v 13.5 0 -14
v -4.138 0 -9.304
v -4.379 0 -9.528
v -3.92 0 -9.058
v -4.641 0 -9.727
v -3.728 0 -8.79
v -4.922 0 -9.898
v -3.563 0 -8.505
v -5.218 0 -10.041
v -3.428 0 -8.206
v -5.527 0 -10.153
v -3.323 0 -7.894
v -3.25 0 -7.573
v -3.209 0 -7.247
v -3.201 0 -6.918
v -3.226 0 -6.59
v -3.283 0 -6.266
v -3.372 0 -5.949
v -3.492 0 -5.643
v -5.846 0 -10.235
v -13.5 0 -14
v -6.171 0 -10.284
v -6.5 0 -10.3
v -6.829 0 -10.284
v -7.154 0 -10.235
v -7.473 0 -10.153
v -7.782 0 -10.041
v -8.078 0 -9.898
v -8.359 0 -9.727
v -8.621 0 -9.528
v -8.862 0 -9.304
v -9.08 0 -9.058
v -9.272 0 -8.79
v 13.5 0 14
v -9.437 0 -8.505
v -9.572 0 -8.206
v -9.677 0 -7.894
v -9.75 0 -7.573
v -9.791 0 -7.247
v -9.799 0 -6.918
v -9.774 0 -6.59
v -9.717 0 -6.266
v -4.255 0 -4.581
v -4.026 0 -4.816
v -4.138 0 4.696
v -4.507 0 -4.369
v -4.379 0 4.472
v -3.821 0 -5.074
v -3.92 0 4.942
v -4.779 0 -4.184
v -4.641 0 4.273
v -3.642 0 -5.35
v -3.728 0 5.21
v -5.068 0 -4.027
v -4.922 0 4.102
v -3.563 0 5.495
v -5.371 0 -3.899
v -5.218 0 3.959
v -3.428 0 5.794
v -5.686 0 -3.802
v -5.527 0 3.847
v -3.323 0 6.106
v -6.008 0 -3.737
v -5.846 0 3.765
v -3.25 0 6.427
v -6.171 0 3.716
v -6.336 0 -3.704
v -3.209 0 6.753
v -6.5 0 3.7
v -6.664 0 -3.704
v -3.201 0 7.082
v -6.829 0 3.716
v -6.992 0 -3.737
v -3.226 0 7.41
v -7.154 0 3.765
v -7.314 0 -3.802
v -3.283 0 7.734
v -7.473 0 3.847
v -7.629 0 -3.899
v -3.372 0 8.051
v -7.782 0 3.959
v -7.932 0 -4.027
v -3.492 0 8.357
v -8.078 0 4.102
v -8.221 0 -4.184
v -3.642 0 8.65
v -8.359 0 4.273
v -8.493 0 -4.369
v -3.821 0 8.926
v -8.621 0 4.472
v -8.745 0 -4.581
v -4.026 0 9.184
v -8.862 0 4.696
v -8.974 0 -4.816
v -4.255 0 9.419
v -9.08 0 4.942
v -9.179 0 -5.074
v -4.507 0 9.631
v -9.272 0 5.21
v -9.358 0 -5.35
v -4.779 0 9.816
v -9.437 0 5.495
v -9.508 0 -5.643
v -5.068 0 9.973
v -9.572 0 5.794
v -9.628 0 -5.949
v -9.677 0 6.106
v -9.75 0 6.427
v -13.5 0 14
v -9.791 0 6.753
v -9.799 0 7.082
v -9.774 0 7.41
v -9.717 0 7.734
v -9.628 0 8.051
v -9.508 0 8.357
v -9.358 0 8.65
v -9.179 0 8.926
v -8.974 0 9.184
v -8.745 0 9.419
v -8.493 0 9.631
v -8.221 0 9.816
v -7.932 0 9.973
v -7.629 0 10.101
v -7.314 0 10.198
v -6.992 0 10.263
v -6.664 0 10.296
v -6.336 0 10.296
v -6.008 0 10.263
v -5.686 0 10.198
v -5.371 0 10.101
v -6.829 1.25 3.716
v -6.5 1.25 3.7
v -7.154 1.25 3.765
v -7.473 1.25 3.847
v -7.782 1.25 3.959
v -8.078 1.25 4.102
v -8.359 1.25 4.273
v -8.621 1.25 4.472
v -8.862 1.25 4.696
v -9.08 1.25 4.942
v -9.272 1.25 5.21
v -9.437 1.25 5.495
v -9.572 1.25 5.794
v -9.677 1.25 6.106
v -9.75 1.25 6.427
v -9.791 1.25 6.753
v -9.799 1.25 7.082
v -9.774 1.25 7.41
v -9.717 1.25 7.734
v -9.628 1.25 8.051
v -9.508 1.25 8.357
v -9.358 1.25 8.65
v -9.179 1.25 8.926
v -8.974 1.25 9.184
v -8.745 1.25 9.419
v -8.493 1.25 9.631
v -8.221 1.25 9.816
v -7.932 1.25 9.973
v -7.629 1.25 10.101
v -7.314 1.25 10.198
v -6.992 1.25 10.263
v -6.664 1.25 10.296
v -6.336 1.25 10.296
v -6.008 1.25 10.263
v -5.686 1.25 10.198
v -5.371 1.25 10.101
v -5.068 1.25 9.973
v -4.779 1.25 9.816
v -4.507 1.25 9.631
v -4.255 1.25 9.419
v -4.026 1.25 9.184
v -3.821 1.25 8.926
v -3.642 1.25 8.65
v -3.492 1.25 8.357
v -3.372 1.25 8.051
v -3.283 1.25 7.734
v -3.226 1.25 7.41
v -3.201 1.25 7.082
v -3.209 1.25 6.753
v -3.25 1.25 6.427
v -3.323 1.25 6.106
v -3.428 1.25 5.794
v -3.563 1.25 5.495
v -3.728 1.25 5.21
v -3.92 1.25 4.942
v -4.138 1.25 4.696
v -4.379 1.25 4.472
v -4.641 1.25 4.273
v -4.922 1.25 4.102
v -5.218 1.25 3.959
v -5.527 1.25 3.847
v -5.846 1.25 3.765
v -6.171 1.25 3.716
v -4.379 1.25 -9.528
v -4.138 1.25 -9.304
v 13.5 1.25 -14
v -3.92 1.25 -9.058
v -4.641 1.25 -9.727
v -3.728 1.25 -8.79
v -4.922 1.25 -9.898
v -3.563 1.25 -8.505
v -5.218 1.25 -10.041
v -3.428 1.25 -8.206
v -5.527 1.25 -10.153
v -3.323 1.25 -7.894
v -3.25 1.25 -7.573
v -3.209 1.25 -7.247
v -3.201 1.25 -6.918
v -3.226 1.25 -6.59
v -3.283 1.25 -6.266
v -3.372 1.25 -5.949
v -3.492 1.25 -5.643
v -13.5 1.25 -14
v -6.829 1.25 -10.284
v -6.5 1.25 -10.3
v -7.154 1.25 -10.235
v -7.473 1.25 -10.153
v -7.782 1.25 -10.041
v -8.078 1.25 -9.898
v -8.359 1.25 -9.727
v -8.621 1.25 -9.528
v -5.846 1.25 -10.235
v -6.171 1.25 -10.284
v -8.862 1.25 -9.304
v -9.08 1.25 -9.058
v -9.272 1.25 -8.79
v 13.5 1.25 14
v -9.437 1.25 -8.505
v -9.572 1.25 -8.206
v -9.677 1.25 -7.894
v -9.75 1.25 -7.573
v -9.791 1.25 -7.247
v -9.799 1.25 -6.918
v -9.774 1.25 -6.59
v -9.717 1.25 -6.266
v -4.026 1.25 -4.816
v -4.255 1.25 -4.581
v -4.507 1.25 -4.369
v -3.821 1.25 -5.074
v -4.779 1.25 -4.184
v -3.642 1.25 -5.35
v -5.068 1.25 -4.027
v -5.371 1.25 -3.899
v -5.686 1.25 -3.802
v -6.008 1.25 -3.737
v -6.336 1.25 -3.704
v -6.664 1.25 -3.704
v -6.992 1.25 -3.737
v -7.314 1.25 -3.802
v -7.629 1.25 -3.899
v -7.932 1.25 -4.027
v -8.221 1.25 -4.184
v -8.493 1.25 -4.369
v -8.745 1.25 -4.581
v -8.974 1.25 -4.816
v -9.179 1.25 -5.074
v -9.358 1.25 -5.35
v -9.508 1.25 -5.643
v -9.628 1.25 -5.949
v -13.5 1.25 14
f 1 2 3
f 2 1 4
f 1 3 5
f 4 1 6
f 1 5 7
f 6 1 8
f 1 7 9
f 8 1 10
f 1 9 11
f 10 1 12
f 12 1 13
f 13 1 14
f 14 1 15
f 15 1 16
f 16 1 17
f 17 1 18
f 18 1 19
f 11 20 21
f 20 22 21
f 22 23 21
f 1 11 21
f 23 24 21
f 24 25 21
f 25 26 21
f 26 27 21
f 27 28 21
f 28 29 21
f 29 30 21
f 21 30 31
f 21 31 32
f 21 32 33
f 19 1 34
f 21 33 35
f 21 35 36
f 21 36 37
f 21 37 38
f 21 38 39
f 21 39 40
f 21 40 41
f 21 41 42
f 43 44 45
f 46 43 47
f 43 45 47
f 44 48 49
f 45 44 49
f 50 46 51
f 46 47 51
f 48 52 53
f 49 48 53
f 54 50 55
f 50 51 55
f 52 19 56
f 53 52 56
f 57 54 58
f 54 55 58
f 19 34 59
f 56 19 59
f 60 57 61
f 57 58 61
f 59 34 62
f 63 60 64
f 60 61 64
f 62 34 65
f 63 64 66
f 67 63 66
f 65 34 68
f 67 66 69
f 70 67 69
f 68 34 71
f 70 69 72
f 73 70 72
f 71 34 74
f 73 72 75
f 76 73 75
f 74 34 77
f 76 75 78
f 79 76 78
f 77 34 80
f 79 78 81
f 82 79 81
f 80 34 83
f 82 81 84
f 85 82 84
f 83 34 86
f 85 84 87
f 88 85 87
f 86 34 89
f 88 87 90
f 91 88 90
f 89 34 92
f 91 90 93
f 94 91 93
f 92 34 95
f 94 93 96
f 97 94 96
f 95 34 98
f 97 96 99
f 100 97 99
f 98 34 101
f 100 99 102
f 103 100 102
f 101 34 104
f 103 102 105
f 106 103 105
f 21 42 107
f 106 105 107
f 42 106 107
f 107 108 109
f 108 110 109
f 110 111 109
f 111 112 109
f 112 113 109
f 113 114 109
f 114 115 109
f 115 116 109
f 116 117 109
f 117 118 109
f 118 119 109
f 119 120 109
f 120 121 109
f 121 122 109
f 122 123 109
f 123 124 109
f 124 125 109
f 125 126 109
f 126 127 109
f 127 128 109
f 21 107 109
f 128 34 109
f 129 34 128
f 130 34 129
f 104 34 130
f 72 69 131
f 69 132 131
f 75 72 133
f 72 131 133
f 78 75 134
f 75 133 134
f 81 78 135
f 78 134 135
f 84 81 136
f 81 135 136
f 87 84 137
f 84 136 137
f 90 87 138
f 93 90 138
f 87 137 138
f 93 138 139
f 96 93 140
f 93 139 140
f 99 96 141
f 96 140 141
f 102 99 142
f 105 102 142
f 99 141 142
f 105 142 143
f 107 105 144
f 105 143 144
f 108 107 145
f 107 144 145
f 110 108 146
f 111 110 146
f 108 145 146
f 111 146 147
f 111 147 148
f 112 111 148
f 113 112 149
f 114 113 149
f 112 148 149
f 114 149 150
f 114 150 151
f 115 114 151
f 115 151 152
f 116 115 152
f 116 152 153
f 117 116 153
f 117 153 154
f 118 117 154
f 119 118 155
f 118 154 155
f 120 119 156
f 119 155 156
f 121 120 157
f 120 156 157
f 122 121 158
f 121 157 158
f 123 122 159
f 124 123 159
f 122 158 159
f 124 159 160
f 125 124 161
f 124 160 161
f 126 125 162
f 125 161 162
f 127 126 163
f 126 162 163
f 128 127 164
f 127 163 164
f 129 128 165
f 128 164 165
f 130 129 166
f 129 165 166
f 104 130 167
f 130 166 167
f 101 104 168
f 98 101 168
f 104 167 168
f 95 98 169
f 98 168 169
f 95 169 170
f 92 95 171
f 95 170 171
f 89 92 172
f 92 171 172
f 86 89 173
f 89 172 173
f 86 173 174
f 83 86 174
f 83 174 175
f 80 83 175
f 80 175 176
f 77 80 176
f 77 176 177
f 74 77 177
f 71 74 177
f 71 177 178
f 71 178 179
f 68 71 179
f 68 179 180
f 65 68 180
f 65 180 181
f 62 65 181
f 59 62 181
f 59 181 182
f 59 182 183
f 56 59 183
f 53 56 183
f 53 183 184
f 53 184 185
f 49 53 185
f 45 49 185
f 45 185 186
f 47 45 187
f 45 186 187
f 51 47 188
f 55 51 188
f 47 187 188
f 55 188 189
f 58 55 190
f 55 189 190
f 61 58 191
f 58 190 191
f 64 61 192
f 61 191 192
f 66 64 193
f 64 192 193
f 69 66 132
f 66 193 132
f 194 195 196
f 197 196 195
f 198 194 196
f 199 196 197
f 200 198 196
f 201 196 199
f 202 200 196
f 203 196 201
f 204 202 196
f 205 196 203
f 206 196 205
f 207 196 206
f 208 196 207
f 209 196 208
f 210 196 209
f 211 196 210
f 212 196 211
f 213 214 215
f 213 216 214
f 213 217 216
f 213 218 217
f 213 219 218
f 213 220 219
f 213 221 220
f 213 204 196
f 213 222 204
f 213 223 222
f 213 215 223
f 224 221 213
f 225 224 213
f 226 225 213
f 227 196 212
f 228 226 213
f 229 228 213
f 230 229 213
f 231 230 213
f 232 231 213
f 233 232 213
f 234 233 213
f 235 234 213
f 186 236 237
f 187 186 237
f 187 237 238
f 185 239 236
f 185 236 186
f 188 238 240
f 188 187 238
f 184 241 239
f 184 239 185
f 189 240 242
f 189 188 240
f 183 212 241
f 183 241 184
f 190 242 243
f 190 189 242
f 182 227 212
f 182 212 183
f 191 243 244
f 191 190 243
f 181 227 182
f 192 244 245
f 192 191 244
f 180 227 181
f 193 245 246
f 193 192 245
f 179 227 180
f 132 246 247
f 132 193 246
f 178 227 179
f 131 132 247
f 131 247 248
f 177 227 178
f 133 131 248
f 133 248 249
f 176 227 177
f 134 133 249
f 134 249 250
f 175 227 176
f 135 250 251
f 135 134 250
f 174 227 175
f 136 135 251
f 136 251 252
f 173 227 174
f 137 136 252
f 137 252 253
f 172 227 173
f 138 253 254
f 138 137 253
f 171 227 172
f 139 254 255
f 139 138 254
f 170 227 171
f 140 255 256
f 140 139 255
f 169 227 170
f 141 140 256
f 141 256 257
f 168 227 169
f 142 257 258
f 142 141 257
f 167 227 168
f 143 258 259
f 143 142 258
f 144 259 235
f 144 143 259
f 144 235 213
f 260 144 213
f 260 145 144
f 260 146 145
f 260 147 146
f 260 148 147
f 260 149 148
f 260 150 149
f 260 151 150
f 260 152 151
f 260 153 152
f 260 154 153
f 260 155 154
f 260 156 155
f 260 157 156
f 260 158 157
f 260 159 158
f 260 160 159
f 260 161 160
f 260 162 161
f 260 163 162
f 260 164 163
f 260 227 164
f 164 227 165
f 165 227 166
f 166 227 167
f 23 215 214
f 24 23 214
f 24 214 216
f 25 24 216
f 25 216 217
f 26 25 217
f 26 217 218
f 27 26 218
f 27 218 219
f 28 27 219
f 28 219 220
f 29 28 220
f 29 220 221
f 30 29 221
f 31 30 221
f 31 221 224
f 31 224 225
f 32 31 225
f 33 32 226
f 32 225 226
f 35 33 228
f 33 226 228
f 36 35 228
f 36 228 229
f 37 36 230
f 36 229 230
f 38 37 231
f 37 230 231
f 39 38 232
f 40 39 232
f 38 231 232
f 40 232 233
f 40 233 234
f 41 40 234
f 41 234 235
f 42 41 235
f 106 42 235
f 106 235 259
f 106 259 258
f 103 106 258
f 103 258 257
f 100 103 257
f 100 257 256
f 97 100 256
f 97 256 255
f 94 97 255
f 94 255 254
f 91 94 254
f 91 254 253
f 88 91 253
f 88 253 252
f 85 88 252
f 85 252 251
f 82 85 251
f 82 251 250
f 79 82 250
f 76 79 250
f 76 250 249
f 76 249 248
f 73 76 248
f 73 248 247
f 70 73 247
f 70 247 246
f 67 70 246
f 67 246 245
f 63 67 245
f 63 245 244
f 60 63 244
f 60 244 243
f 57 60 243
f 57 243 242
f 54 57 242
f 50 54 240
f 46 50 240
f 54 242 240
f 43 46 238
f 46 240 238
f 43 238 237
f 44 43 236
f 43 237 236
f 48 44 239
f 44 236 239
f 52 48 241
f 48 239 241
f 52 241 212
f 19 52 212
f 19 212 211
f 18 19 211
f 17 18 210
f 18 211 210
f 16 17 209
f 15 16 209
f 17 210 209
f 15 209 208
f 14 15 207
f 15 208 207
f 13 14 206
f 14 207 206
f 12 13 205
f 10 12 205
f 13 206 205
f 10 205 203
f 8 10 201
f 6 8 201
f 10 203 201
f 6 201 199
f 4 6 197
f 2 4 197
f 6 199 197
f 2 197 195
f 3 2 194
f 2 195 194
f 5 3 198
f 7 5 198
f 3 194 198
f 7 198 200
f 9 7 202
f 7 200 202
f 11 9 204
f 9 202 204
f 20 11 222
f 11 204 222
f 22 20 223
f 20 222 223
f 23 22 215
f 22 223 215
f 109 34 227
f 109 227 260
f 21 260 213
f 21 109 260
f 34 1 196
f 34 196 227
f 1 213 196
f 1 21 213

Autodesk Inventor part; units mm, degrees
ref_plane "YZ Plane" through (0, 0, 0) normal (1, 0, 0) x (0, 1, 0)
ref_plane "XZ Plane" through (0, 0, 0) normal (0, 1, 0) x (-1, 0, 0)
ref_plane "XY Plane" through (0, 0, 0) normal (0, 0, 1) x (1, 0, 0)
sketch "Sketch1" plane through (0, 0, 0) normal (0, 1, 0) x (-1, 0, 0)
  line L0 (-13.5, 14) -> (13.5, 14)
  line L1 (13.5, 14) -> (13.5, -14)
  line L2 (13.5, -14) -> (-13.5, -14)
  line L3 (-13.5, -14) -> (-13.5, 14)
  line L4 (-13.5, 14) -> (13.5, -14) construction
  line L5 (13.5, 14) -> (-13.5, -14) construction
  point P0 (0, 0)
  dimension "d0" = 27
  dimension "d1" = 28
extrude "Extrusion1" add sketch "Sketch1" along normal blind 1.25
sketch "Sketch2" plane through (0, 0, 0) normal (0, -1, 0) x (1, 0, 0)
  circle A0 centre (-6.5, 7) radius 3.3 projected
  circle A1 centre (-6.5, -7) radius 3.3 projected
  line L0 (-13.5, 14) -> (-13.5, -14) projected
  line L1 (19.5, -14) -> (-13.5, -14) projected
  line L2 (19.5, 14) -> (19.5, -14) projected
  line L3 (-13.5, 14) -> (19.5, 14) projected
  point P0 (0, 0)
hole "Hole1" at (-6.5, 0, 7) at (-6.5, 0, -7) direction (0, 1, 0) diameter 6.6 depth 8 tip angle 118 clearance for "Countersunk Flat Head Screw ISO 2009/7046" size "M6" standard "ISO"
properties part number "SP37V1 Suplemento Refuerzo"
